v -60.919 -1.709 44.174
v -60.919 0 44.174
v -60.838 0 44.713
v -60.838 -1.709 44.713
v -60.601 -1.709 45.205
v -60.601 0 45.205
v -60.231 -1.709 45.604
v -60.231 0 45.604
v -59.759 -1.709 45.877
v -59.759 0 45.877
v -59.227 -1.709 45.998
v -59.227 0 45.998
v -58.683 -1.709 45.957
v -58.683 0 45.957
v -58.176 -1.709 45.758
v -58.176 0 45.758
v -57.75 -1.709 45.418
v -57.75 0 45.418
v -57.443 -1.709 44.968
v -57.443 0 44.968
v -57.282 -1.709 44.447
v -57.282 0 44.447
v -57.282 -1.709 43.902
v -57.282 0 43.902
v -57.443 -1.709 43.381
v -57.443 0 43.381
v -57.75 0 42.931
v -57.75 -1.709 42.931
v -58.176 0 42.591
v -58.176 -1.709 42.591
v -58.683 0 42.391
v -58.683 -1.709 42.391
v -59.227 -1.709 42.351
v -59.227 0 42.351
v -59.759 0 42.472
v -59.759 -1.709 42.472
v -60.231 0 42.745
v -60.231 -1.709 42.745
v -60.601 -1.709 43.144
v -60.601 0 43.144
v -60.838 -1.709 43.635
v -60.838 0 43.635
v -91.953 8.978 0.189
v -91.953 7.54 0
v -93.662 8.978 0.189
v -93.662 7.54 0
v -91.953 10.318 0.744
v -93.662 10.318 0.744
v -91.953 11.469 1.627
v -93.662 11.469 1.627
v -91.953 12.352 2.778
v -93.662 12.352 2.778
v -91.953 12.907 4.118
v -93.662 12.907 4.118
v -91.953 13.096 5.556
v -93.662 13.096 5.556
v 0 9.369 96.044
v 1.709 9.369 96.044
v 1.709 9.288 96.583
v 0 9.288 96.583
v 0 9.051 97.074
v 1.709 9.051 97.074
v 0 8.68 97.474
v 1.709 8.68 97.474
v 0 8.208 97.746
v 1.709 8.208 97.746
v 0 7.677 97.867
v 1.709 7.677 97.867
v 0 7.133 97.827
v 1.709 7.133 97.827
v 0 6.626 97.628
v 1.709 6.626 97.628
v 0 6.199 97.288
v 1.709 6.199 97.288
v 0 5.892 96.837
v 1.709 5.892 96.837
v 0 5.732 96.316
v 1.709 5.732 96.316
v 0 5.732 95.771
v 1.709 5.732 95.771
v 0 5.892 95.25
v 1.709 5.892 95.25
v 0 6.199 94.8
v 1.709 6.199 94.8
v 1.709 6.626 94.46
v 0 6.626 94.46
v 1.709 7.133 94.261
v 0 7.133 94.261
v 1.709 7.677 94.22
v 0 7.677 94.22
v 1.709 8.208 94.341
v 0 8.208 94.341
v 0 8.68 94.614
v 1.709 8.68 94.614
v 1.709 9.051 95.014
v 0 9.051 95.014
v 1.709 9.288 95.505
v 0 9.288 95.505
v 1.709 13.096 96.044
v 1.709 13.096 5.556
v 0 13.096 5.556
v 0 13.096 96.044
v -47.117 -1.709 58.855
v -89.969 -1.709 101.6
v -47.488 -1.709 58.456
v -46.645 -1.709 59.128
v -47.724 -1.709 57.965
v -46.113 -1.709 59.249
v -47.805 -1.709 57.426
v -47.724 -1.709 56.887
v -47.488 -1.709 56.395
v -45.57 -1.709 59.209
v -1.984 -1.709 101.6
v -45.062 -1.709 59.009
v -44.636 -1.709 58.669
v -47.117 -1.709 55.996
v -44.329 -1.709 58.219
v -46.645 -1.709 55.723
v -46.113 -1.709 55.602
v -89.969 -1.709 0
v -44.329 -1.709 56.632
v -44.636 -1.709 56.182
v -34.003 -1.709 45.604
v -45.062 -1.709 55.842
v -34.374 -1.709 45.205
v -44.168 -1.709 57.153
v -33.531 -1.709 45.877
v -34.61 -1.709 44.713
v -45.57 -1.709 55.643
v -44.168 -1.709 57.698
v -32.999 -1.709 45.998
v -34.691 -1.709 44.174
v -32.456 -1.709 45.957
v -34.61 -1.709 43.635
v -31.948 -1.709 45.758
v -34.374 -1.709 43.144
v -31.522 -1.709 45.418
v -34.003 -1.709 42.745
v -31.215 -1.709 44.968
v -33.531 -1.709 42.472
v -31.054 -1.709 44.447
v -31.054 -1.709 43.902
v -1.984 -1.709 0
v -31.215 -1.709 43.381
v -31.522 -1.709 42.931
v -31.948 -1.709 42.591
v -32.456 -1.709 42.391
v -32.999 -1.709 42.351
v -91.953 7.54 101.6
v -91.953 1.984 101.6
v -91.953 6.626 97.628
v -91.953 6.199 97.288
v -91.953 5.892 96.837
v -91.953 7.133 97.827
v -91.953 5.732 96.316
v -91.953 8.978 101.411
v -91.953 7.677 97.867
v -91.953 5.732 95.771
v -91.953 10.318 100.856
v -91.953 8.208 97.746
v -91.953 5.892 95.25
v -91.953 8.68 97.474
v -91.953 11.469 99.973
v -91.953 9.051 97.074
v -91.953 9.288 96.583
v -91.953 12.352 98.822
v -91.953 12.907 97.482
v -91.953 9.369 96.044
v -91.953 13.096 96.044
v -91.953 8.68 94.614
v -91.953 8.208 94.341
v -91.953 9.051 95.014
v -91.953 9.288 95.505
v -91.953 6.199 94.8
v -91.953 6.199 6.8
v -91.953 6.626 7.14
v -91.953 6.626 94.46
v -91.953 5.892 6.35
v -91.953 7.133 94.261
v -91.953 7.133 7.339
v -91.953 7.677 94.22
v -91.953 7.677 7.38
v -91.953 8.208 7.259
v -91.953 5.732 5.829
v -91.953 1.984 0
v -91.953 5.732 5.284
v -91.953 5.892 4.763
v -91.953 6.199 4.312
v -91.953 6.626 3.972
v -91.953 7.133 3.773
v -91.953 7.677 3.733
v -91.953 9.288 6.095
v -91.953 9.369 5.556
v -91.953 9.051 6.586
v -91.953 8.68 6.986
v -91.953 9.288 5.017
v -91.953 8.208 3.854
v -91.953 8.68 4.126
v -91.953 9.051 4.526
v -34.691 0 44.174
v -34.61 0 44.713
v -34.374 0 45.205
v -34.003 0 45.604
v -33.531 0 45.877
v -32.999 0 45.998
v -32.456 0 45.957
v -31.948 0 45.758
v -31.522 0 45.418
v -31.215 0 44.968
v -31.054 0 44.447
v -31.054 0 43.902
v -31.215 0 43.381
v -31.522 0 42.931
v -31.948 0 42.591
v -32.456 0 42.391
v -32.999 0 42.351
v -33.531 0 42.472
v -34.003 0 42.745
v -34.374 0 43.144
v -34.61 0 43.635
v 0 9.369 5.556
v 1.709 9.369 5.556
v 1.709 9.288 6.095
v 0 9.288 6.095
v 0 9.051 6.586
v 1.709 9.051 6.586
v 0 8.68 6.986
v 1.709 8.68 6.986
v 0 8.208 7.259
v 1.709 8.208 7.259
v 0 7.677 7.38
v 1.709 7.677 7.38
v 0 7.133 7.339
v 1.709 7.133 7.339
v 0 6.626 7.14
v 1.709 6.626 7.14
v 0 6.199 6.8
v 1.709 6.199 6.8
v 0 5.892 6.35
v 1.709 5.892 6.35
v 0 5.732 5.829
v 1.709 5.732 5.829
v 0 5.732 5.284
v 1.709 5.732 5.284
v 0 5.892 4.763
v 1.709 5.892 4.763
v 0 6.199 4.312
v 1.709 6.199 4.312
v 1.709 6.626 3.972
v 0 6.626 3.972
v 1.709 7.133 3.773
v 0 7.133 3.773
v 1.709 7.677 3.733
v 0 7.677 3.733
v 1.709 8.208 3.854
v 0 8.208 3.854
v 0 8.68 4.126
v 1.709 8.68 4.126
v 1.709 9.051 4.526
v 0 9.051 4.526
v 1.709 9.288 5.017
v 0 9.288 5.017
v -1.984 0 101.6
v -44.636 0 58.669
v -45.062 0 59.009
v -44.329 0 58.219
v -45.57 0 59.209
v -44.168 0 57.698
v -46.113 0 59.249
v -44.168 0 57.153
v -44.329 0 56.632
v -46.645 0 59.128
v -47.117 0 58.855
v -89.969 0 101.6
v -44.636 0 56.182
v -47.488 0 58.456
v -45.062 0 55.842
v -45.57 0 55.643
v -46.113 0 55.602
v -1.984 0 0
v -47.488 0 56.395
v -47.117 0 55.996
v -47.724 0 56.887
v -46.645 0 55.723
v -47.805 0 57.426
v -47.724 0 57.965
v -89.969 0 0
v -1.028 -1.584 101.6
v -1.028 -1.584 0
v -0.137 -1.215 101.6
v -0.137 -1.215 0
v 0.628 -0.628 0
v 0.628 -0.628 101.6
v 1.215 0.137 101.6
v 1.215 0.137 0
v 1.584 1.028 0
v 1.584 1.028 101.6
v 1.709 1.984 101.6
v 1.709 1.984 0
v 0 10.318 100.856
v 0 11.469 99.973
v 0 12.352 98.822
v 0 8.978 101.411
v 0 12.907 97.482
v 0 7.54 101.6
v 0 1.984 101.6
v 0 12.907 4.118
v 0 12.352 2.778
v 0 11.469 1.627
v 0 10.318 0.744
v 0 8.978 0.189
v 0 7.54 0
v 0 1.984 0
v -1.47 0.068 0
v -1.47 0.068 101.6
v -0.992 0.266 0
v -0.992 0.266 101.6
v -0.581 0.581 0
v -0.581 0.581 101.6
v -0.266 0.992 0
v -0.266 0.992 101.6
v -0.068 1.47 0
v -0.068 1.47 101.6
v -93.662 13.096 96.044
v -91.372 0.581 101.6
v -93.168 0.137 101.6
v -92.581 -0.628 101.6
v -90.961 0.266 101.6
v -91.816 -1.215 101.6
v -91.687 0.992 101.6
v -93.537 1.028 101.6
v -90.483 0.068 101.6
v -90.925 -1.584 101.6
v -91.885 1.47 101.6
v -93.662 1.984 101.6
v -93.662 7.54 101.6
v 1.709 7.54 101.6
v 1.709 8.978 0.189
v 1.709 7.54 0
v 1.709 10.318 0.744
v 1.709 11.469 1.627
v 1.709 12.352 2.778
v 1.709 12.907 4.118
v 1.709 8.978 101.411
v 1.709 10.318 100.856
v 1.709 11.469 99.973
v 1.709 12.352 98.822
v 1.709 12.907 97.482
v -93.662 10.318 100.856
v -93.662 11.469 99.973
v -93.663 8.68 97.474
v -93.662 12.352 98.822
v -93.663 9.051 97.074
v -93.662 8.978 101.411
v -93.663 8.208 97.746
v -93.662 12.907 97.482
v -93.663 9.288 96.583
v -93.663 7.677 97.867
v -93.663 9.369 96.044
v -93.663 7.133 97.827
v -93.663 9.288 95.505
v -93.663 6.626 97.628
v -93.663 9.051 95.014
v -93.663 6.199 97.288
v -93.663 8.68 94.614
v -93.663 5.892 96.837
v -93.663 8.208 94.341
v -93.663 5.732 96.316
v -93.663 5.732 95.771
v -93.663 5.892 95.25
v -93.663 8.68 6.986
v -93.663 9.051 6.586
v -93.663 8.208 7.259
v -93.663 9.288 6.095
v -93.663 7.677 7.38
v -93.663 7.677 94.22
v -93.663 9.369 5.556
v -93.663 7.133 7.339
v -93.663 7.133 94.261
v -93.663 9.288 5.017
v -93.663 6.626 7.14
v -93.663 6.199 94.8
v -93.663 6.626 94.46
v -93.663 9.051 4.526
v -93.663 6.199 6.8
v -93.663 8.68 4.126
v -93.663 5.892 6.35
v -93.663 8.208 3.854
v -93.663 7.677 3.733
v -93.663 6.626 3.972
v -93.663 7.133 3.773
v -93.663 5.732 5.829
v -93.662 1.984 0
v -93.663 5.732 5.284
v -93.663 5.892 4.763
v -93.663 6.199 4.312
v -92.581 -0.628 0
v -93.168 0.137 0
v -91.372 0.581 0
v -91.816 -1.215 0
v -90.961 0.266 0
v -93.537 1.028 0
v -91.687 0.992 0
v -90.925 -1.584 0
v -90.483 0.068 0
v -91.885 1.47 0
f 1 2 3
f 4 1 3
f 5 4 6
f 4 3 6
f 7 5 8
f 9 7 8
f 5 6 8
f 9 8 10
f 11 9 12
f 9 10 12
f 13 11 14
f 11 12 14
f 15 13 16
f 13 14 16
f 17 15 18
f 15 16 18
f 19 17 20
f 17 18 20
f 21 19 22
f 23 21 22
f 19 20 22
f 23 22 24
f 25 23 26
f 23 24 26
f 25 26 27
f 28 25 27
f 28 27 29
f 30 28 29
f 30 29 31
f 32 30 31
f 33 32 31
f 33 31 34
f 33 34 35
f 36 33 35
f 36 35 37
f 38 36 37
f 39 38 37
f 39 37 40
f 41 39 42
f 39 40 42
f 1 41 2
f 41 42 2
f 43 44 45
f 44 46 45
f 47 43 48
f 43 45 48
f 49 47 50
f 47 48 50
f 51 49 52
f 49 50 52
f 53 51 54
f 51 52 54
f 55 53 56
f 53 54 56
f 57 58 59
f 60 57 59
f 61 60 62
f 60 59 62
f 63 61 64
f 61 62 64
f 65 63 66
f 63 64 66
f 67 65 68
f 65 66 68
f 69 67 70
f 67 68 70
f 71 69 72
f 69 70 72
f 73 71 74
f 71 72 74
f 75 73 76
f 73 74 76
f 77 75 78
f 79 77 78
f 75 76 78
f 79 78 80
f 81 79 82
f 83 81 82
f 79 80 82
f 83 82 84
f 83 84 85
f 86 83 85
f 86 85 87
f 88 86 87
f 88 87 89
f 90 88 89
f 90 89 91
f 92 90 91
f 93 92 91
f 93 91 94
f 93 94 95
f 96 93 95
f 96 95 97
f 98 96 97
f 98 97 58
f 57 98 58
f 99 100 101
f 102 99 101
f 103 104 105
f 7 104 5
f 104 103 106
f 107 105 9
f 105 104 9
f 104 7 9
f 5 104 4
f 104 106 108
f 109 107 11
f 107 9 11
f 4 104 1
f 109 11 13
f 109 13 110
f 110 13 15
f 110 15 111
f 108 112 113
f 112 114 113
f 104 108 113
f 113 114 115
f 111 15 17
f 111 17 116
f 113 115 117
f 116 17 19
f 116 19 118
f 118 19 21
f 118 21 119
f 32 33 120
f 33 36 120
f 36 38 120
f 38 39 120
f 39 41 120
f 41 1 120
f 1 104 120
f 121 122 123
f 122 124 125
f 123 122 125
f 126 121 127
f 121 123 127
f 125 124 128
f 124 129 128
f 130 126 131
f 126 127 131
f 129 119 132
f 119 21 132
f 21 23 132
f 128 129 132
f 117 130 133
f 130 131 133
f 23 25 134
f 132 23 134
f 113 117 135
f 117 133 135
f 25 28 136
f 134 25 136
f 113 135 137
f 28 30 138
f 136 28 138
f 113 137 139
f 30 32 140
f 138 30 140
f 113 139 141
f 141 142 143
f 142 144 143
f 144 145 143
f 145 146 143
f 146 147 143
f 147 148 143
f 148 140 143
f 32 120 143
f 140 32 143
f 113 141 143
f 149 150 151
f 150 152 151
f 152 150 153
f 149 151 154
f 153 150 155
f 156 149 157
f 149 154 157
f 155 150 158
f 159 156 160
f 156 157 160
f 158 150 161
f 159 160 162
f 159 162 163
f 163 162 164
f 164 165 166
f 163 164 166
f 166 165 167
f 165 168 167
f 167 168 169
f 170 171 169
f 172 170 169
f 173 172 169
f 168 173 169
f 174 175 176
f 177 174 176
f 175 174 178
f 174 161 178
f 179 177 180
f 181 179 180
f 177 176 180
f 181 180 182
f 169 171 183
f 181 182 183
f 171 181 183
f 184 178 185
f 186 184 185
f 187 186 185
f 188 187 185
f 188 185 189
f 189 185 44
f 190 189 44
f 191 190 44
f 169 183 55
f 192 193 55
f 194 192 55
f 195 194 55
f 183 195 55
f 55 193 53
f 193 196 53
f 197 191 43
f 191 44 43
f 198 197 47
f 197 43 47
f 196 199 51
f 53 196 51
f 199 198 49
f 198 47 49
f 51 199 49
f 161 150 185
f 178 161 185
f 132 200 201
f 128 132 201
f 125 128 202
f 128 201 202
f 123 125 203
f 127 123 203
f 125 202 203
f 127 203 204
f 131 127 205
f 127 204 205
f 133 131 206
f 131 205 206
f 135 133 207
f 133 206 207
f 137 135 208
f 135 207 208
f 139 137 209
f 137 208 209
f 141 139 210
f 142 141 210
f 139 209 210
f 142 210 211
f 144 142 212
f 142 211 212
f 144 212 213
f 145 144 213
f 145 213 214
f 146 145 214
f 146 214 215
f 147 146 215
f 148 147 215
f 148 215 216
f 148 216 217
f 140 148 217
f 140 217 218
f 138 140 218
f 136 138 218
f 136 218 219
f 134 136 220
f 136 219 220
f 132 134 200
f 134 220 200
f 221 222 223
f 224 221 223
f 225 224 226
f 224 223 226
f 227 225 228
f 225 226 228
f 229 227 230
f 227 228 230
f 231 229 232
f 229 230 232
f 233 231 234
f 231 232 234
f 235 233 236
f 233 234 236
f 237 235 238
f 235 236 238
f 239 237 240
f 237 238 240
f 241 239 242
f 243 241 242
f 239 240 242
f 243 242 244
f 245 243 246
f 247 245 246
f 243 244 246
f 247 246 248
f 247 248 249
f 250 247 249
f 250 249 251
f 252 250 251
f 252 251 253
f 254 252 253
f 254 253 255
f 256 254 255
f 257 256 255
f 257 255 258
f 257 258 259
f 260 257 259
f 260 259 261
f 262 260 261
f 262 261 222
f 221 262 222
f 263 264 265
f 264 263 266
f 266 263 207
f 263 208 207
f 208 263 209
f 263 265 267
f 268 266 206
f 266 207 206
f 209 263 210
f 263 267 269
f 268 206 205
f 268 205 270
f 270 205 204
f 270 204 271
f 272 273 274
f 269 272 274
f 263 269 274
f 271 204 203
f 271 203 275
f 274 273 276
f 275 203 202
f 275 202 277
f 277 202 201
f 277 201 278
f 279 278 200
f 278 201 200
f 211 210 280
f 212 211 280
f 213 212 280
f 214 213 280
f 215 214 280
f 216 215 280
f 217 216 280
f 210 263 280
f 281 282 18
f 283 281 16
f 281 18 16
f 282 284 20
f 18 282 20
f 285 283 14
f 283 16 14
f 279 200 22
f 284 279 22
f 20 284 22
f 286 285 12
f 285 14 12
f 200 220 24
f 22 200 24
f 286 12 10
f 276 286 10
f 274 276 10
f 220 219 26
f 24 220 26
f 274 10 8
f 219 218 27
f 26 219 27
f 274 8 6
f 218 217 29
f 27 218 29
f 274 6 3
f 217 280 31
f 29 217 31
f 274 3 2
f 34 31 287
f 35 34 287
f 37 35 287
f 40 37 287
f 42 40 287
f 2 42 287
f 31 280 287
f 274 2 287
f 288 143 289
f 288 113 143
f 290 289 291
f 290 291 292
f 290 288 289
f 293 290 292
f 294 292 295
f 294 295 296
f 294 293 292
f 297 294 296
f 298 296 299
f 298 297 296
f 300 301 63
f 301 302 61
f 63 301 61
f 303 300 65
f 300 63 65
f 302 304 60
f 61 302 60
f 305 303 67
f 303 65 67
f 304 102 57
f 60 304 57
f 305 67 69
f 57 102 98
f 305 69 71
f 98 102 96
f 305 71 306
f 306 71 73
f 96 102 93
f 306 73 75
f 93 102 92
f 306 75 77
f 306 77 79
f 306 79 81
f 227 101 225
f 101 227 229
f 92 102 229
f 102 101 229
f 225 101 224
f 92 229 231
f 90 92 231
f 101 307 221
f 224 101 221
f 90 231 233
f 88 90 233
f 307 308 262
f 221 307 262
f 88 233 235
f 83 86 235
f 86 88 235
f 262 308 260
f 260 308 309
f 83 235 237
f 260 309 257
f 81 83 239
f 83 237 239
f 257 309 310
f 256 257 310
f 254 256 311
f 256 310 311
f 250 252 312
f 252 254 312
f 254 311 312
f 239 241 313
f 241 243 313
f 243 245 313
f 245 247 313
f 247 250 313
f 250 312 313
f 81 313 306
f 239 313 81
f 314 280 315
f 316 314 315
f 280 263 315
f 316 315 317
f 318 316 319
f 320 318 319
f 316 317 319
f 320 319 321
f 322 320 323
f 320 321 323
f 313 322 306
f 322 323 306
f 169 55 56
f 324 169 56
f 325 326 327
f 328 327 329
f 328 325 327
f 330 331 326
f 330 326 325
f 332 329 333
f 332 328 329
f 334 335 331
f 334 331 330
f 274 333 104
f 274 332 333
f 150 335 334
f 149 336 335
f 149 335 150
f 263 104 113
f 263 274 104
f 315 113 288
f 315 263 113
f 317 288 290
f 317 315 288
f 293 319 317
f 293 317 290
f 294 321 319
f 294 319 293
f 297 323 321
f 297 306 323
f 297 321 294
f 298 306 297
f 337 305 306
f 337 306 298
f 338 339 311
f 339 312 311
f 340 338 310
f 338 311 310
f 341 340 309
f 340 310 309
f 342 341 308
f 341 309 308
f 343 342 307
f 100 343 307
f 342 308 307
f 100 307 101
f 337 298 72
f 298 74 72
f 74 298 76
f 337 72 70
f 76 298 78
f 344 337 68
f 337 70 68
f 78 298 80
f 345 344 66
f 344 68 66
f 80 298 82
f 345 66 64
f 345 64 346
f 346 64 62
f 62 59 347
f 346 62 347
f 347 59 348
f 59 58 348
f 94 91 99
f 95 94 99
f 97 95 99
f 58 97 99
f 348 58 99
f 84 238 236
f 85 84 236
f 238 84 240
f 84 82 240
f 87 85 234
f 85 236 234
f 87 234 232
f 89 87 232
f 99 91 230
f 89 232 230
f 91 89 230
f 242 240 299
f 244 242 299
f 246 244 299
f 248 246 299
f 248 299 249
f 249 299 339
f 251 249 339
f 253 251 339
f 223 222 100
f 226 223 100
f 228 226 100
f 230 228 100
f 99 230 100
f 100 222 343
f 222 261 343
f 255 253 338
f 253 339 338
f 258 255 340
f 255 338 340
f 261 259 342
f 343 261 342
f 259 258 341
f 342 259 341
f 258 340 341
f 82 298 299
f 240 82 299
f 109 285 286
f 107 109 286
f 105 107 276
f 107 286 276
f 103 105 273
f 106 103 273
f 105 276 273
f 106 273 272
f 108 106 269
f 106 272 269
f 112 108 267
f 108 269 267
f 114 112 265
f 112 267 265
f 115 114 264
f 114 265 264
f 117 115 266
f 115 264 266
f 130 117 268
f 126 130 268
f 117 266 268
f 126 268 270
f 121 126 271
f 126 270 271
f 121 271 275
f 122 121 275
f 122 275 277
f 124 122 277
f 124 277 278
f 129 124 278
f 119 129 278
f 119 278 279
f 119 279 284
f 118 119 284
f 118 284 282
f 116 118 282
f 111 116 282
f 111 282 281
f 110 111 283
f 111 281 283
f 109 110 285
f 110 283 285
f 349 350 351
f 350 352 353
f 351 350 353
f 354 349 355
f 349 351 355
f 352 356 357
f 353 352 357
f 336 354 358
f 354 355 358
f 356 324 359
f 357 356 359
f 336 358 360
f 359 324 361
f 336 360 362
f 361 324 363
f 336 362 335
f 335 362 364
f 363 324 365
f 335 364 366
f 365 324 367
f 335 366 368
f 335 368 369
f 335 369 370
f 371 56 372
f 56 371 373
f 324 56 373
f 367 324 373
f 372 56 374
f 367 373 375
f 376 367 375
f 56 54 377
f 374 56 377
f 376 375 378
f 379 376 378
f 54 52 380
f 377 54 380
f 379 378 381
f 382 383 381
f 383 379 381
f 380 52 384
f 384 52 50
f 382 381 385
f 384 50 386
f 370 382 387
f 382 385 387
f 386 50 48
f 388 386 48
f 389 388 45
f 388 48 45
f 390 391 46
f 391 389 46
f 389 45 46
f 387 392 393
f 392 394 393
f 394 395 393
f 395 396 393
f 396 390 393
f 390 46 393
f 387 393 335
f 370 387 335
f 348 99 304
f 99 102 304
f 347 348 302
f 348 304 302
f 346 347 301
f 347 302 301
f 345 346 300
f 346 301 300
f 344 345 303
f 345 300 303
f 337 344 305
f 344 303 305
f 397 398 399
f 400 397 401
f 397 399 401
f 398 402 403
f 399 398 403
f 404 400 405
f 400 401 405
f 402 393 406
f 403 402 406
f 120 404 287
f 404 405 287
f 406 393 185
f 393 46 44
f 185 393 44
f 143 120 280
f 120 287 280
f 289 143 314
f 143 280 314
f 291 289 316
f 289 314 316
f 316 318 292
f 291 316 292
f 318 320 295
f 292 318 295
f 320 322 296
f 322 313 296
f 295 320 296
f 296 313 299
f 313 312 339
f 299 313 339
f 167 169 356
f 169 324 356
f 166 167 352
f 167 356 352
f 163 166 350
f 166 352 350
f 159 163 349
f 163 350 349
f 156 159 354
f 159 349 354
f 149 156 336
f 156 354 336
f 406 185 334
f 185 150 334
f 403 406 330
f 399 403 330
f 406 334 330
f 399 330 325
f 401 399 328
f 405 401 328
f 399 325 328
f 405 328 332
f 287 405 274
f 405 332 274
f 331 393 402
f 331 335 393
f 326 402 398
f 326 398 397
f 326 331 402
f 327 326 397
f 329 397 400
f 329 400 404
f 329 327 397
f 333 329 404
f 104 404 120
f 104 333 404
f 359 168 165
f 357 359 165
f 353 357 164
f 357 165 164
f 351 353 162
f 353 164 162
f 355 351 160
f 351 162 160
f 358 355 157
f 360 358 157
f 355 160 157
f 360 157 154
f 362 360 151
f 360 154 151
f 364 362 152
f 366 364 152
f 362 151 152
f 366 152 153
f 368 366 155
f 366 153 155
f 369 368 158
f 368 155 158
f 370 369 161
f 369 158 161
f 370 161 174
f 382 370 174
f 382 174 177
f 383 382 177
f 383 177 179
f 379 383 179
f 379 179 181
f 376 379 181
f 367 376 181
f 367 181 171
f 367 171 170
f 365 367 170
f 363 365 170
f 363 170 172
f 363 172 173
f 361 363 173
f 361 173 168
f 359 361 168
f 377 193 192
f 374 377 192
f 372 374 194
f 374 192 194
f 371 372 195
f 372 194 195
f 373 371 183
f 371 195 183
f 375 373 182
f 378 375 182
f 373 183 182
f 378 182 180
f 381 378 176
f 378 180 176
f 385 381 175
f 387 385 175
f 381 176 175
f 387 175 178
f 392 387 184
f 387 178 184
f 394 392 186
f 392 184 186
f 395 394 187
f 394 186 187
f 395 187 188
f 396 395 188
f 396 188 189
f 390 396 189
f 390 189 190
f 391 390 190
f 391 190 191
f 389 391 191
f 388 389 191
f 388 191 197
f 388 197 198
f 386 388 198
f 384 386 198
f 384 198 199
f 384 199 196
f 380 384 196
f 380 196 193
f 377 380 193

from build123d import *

# Parameters (mm, degrees)
F1_DEPTH = 101.6
F2_R     = 3.69316
F3_R     = 1.98374
F4_R     = 1.8288
F5_DEPTH = 95.37192
F6_R     = 5.55625
F7_R     = 1.8288
F8_DEPTH = 1.70942


with BuildPart() as f1:
    # F0 (on Top) → F1 (new body)
    with BuildSketch(Plane.XY):
        Polygon((0, 13.09624), (0, 0), (-91.95308, 0), (-91.95308, 13.09624), (-93.6625, 13.09624), (-93.6625, -1.70942), (1.70942, -1.70942), (1.70942, 13.09624), align=None)
    extrude(amount=F1_DEPTH)

    # F2
    f2_edges = [f1.edges().sort_by_distance(p)[0] for p in [
        (1.70942, -1.70942, 50.8),
        (-93.6625, -1.70942, 50.8),
    ]]
    fillet(f2_edges, radius=F2_R)

    # F3
    f3_edges = [f1.edges().sort_by_distance(p)[0] for p in [
        (0, 0, 50.8),
        (-91.95308, 0, 50.8),
    ]]
    fillet(f3_edges, radius=F3_R)

    # F4 (on face) → F5 (cut, through all)
    with BuildSketch(Plane.YZ.offset(1.70942)):
        with Locations((7.53999, 96.04375)):
            Circle(F4_R)
        with Locations((7.53999, 5.55625)):
            Circle(F4_R)
    extrude(amount=-F5_DEPTH, mode=Mode.SUBTRACT)

    # F6
    f6_edges = [f1.edges().sort_by_distance(p)[0] for p in [
        (-92.80779, 13.09624, 101.6),
        (-92.80779, 13.09624, 0),
        (0.85471, 13.09624, 0),
        (0.85471, 13.09624, 101.6),
    ]]
    fillet(f6_edges, radius=F6_R)

    # F7 (on face) → F8 (cut, through all)
    with BuildSketch(Plane(origin=(0, 0, 0), x_dir=(-1, 0, 0), z_dir=(0, 1, 0))):
        with Locations((59.0904203, 44.1744082526)):
            Circle(F7_R)
        with Locations((45.97654, 57.4255917474)):
            Circle(F7_R)
        with Locations((32.8626597, 44.1744082526)):
            Circle(F7_R)
    extrude(amount=-F8_DEPTH, mode=Mode.SUBTRACT)


solid = f1.part
